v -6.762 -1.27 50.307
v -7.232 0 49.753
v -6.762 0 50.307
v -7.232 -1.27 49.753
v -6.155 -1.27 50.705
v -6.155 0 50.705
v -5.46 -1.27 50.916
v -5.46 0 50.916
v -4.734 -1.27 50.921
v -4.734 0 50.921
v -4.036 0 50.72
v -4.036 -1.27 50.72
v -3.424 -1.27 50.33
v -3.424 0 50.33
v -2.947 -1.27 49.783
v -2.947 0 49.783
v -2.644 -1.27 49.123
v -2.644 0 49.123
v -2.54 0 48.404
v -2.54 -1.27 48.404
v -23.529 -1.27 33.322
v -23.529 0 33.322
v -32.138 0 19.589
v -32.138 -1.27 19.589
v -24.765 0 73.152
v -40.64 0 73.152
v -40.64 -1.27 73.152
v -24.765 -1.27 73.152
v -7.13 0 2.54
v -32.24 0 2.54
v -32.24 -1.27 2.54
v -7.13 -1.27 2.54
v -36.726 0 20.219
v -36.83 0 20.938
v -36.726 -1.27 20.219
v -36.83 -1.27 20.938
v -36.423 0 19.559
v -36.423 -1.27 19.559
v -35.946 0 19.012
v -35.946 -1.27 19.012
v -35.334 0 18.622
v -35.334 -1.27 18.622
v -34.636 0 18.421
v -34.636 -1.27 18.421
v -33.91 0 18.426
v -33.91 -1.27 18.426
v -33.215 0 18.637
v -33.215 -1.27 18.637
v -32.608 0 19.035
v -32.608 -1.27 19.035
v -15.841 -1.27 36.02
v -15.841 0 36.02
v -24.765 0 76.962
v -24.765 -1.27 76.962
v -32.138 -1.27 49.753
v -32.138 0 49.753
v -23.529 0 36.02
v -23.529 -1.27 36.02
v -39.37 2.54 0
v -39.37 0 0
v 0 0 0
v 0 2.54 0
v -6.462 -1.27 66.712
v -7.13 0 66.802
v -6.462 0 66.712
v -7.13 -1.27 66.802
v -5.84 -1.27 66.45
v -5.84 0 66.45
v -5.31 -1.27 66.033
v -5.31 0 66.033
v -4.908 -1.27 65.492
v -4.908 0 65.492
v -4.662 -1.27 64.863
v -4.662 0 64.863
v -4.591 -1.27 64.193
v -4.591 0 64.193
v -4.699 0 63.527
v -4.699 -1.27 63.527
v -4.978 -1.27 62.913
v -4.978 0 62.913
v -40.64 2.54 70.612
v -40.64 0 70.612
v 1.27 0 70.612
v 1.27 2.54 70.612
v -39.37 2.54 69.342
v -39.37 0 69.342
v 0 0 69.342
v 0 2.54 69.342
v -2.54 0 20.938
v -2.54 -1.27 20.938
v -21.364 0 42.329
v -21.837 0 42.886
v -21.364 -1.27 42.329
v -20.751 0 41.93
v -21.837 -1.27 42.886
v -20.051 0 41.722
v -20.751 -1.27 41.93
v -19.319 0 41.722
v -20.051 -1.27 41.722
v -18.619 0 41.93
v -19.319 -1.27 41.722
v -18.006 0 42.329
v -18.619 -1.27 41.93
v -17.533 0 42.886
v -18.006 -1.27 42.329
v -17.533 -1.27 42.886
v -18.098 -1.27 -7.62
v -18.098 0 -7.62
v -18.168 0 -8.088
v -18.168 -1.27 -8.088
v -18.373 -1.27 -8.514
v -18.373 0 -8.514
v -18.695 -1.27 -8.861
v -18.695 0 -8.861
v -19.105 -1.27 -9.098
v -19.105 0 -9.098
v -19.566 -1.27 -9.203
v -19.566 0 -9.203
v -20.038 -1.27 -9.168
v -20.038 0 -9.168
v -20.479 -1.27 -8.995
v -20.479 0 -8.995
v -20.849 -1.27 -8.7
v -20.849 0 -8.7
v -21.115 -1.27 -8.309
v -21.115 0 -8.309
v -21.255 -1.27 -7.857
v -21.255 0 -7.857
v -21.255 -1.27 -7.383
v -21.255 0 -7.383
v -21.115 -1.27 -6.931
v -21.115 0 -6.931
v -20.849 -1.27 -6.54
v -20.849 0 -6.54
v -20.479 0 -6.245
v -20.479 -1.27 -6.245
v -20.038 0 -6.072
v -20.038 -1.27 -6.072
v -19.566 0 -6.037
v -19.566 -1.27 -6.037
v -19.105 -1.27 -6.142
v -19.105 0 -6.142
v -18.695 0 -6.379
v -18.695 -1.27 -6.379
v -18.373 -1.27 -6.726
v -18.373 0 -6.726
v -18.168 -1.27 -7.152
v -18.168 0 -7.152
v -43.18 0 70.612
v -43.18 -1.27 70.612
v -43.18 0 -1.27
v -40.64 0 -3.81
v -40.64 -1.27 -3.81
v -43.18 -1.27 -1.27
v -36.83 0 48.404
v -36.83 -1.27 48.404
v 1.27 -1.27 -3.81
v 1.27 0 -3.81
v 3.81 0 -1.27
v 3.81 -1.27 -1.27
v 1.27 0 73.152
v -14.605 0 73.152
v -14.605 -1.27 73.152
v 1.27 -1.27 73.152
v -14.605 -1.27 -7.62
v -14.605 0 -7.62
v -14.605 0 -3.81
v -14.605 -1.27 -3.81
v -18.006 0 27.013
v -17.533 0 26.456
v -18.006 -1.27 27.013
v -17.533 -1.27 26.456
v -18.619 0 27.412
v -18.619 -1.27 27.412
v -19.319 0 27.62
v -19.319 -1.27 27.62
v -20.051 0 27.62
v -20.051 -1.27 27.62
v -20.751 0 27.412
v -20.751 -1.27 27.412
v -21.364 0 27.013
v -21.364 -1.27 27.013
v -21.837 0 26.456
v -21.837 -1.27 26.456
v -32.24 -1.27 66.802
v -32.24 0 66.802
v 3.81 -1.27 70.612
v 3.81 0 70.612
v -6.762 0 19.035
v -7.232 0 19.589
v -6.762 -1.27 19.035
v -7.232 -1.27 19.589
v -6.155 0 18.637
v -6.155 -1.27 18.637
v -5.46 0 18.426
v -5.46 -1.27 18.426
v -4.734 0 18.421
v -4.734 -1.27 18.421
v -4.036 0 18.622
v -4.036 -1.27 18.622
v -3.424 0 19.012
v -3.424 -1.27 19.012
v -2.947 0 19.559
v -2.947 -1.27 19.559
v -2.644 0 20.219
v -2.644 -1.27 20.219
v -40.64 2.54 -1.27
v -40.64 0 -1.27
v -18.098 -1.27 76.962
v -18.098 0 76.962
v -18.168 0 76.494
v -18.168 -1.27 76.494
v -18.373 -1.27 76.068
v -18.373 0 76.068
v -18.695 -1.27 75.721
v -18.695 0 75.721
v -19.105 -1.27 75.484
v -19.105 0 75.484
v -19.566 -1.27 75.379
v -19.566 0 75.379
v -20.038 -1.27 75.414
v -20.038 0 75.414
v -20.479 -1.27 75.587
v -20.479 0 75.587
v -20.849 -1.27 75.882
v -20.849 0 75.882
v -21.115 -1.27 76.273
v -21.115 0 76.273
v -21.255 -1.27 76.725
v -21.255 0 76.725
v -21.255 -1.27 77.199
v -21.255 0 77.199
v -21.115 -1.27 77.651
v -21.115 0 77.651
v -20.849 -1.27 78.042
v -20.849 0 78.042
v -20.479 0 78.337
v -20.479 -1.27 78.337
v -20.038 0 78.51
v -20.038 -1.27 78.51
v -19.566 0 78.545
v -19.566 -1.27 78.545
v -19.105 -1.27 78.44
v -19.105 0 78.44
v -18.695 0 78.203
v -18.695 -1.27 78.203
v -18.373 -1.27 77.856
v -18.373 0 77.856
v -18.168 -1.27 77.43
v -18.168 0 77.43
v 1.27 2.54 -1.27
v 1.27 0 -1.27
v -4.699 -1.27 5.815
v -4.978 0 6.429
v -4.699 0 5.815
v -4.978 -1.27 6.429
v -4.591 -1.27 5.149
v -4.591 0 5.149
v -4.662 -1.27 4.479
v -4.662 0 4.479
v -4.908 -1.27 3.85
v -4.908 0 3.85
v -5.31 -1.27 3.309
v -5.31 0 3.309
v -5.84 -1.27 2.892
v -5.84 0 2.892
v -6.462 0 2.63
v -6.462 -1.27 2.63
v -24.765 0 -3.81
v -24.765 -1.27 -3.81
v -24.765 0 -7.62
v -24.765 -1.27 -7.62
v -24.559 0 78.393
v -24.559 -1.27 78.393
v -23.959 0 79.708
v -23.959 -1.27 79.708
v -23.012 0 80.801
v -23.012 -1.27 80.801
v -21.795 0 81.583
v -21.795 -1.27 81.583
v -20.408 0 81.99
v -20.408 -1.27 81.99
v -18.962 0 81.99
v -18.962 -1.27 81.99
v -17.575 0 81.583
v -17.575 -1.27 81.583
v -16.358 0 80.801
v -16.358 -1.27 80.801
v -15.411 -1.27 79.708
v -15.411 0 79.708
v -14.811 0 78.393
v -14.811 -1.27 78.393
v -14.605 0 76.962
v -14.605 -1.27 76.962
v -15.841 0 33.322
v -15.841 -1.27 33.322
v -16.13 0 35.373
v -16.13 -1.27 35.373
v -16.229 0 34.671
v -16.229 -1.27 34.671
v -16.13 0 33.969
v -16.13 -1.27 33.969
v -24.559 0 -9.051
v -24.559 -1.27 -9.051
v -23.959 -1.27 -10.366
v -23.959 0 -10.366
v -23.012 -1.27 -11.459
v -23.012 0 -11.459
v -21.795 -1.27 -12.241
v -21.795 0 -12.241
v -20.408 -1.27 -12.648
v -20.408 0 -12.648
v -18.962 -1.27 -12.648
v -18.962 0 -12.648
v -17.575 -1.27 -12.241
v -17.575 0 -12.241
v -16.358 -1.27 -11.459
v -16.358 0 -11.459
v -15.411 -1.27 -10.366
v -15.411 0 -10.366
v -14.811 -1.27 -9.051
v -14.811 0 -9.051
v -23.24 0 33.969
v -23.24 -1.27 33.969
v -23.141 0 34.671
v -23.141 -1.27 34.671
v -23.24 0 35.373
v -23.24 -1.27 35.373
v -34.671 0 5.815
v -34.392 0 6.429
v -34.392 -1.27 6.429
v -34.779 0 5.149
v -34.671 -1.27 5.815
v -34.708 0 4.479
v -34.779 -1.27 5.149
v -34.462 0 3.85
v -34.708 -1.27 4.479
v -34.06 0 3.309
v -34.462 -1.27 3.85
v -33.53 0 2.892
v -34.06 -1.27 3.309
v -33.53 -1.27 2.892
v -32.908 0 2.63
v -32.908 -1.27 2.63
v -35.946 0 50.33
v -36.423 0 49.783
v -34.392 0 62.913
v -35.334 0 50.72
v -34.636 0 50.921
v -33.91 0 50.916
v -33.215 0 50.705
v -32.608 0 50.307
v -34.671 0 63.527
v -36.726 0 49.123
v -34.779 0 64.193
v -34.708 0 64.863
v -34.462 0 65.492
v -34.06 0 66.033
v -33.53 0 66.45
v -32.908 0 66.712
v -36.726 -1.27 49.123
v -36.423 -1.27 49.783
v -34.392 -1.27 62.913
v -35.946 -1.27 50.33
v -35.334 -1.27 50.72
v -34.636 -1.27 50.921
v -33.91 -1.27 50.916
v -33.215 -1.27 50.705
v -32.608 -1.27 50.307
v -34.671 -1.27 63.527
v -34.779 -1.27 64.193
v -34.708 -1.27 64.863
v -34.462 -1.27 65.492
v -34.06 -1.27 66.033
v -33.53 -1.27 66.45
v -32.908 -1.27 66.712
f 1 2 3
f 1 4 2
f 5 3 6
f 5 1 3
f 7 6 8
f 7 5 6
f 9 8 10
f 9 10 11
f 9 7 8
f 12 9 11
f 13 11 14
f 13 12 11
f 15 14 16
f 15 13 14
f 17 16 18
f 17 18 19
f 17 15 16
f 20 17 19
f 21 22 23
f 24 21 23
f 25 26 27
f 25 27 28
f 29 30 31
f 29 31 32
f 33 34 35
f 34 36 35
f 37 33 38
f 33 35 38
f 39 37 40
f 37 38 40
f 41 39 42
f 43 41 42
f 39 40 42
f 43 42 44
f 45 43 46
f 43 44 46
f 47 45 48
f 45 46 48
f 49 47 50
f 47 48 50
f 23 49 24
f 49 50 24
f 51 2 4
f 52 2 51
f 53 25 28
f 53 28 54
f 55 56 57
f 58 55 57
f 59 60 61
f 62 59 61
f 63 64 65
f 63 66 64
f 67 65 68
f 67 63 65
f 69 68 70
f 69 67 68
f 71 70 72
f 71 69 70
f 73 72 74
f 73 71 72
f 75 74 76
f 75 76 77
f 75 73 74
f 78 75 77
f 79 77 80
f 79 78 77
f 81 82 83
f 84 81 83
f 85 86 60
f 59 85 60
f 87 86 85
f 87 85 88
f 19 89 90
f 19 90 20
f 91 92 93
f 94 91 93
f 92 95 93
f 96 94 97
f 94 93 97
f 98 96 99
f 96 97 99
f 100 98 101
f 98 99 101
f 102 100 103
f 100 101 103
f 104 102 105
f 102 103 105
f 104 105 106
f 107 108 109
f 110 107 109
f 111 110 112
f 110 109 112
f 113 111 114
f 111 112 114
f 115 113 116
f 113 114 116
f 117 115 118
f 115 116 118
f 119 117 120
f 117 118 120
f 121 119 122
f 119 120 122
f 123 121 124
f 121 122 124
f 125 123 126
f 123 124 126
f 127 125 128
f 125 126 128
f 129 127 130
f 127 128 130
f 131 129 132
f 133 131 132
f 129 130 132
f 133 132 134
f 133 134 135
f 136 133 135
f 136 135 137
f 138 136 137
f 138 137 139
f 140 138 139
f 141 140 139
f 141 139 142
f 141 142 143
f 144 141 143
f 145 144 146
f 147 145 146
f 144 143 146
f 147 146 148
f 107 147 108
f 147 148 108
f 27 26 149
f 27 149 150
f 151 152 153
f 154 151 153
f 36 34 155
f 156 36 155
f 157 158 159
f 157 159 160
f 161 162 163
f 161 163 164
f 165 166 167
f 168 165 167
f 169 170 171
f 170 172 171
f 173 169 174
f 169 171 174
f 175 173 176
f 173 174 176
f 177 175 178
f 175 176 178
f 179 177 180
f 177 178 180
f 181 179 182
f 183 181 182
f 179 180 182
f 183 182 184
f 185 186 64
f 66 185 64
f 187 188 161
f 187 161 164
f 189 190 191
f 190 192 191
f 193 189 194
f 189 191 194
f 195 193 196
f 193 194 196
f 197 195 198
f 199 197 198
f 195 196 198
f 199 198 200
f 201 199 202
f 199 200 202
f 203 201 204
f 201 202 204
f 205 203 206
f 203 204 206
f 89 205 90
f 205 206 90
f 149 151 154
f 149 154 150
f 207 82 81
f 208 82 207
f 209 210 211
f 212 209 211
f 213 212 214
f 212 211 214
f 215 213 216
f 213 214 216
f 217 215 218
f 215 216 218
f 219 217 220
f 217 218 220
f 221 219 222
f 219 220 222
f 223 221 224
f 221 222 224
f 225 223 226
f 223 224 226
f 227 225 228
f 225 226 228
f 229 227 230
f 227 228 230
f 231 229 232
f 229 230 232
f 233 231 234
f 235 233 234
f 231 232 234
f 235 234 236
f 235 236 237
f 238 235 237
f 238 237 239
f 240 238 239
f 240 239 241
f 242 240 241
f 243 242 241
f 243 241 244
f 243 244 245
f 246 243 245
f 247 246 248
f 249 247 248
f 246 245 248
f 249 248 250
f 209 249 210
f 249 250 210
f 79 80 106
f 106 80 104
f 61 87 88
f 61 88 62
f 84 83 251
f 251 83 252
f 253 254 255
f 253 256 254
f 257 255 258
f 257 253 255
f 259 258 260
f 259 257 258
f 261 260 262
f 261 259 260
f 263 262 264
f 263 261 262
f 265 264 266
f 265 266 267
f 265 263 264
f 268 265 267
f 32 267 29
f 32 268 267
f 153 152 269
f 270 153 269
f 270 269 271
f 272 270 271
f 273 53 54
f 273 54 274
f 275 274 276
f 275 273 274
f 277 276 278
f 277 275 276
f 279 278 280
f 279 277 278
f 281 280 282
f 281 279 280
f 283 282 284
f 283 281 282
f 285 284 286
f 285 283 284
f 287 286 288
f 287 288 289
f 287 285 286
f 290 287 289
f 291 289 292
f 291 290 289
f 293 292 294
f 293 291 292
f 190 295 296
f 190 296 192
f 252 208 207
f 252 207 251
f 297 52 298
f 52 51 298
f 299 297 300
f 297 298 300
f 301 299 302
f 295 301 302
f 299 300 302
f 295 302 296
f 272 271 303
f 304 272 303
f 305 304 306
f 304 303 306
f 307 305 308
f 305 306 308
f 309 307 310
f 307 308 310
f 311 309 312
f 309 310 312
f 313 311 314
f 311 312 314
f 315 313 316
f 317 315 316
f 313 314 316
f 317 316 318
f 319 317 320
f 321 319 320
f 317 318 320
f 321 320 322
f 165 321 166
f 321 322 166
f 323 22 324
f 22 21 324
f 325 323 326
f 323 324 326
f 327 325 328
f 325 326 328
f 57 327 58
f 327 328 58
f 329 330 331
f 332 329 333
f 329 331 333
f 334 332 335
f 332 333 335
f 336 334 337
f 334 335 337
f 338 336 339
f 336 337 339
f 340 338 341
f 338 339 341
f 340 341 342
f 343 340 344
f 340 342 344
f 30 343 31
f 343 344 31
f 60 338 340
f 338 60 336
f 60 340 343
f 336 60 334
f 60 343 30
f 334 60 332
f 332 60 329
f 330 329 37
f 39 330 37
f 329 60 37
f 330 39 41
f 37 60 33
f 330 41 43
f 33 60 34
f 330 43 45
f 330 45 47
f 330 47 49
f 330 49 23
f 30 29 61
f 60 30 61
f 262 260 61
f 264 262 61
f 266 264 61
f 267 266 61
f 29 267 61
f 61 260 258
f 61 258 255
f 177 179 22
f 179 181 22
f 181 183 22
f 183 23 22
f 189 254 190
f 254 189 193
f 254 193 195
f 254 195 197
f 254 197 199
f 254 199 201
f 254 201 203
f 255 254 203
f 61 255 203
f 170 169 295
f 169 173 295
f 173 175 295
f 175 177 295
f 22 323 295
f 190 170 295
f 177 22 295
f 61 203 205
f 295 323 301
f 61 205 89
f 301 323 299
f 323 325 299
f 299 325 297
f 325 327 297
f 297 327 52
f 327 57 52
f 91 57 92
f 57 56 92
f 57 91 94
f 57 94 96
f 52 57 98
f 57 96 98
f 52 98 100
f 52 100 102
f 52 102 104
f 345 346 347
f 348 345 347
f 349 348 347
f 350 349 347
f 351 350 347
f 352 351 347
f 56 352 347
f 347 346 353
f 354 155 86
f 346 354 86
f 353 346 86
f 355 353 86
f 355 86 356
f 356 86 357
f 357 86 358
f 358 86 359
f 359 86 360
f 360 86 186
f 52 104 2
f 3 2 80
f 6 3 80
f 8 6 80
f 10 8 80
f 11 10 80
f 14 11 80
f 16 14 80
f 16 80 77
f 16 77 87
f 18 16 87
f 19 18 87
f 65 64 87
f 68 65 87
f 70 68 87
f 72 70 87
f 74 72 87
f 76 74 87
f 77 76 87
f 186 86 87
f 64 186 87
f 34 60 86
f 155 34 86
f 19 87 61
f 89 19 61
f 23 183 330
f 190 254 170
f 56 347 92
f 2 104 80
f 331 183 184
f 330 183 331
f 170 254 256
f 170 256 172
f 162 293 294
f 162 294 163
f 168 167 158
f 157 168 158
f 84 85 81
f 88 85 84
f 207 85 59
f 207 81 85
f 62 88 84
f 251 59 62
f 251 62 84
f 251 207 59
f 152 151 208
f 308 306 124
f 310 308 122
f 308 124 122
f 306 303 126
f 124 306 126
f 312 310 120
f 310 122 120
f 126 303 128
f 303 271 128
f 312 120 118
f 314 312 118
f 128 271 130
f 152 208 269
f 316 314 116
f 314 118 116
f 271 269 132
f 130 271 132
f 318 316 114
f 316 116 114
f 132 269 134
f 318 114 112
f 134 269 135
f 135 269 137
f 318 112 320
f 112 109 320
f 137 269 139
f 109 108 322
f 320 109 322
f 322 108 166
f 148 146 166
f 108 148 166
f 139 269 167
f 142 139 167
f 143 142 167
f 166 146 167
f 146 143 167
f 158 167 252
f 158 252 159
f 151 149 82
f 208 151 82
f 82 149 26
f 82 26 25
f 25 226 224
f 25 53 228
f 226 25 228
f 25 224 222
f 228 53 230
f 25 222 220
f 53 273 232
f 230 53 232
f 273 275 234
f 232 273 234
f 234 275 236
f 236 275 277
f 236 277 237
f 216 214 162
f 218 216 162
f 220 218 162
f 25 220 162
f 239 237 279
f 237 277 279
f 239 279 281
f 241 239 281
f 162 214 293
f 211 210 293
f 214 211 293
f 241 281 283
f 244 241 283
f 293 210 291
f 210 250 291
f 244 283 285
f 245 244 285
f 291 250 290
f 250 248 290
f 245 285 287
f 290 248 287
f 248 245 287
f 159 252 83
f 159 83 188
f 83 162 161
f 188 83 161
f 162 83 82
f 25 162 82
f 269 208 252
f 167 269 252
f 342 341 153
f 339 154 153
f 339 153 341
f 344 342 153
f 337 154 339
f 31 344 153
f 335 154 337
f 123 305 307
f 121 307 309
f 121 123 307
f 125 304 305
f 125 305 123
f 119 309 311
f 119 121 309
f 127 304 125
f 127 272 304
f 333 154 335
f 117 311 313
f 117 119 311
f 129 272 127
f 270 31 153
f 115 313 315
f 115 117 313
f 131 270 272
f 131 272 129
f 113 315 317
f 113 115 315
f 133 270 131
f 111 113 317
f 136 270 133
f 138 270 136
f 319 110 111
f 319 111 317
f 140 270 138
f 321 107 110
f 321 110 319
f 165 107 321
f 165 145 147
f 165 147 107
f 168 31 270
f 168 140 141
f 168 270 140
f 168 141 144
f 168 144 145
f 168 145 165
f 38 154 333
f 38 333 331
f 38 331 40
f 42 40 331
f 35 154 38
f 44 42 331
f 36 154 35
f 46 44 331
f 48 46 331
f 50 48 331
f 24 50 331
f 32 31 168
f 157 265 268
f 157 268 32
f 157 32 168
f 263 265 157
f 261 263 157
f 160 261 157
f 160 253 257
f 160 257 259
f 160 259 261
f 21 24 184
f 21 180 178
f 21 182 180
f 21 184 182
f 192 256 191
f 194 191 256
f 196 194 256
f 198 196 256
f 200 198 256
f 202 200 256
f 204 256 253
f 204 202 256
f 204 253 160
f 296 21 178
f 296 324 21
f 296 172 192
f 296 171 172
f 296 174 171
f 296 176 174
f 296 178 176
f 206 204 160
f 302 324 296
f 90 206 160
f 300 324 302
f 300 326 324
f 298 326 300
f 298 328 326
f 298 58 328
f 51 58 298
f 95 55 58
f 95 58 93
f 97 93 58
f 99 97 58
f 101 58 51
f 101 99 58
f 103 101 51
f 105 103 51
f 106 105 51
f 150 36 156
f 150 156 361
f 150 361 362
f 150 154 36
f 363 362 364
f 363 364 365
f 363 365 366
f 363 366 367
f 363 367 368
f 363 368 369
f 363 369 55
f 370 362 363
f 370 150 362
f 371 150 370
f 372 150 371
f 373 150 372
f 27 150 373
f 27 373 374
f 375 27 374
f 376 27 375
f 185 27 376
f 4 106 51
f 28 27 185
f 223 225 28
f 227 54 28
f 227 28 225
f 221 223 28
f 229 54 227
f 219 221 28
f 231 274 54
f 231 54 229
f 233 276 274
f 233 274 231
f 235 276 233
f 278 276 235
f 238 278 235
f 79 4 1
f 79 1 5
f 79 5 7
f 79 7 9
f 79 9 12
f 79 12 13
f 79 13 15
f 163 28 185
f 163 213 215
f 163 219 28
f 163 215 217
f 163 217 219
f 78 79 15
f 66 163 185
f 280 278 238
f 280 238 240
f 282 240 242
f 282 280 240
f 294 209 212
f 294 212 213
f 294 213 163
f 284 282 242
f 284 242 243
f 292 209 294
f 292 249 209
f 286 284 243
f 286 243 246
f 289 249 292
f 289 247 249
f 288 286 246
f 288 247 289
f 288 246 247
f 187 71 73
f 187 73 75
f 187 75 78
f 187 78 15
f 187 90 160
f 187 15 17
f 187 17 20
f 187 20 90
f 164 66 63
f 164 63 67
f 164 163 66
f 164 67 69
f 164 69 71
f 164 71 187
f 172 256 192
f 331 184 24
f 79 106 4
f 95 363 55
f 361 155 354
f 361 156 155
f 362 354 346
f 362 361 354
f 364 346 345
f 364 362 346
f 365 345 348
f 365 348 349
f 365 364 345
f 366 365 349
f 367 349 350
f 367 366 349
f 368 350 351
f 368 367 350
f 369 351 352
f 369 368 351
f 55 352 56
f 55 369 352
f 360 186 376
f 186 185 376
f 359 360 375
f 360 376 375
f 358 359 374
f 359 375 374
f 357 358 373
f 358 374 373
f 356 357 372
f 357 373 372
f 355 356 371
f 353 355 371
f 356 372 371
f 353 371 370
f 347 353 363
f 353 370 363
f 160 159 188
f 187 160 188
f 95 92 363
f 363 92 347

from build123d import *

# Parameters (mm, degrees)
SKETCH1_W           = 41.91
SKETCH1_H           = 71.882
SKETCH1_W_2         = 39.37
SKETCH1_H_2         = 69.342
BOSS_EXTRUDE4_DEPTH = 2.54
SKETCH5_W           = 46.99
SKETCH5_H           = 76.962
BOSS_EXTRUDE5_DEPTH = 1.27
CHAMFER4_SIZE       = 2.54
CUT_EXTRUDE1_DEPTH  = 2.54
FILLET1_R           = 2.54
SKETCH7_R           = 1.5875
BOSS_EXTRUDE6_DEPTH = 1.27


with BuildPart() as part:
    # Sketch1 → Boss-Extrude4 (new body)
    with BuildSketch(Plane(origin=(0, 0, 0), x_dir=(1, 0, 0), z_dir=(0, 1, 0))):
        with Locations((-19.685, -34.671)):
            Rectangle(SKETCH1_W, SKETCH1_H)
        with Locations((-19.685, -34.671)):
            Rectangle(SKETCH1_W_2, SKETCH1_H_2, mode=Mode.SUBTRACT)
    extrude(amount=BOSS_EXTRUDE4_DEPTH)

    # Sketch5 → Boss-Extrude5 (add)
    with BuildSketch(Plane.XZ):
        with Locations((-19.685, 34.671)):
            Rectangle(SKETCH5_W, SKETCH5_H)
    extrude(amount=BOSS_EXTRUDE5_DEPTH)

    # Chamfer4
    chamfer4_edges = [part.edges().sort_by_distance(p)[0] for p in [
        (-43.18, -0.635, 73.152),
        (-43.18, -0.635, -3.81),
        (3.81, -0.635, -3.81),
        (3.81, -0.635, 73.152),
    ]]
    chamfer(chamfer4_edges, length=CHAMFER4_SIZE)

    # Sketch6 → Cut-Extrude1 (cut)
    with BuildSketch(Plane(origin=(0, 0, 0), x_dir=(1, 0, 0), z_dir=(0, 1, 0))):
        Polygon((-36.83, -2.54), (-2.54, -2.54), (-19.685, -29.888964801), align=None)
        Polygon((-36.83, -12.104070398), (-36.83, -57.237929602), (-22.68284632, -34.671), align=None)
        Polygon((-36.83, -66.802), (-2.54, -66.802), (-19.685, -39.453035199), align=None)
        Polygon((-2.54, -12.104070398), (-2.54, -57.237929602), (-16.68715368, -34.671), align=None)
    extrude(amount=-CUT_EXTRUDE1_DEPTH, mode=Mode.SUBTRACT)

    # Fillet1
    fillet1_edges = [part.edges().sort_by_distance(p)[0] for p in [
        (-2.54, -0.635, 2.54),
        (-19.685, -0.635, 29.888964801),
        (-36.83, -0.635, 2.54),
        (-36.83, -0.635, 66.802),
        (-19.685, -0.635, 39.453035199),
        (-2.54, -0.635, 66.802),
        (-22.68284632, -0.635, 34.671),
        (-36.83, -0.635, 57.237929602),
        (-36.83, -0.635, 12.104070398),
        (-16.68715368, -0.635, 34.671),
        (-2.54, -0.635, 12.104070398),
        (-2.54, -0.635, 57.237929602),
    ]]
    fillet(fillet1_edges, radius=FILLET1_R)

    # Sketch7 → Boss-Extrude6 (add)
    with BuildSketch(Plane(origin=(0, 0, 0), x_dir=(1, 0, 0), z_dir=(0, 1, 0))):
        with BuildLine():
            Line((-14.605, 7.62), (-14.605, 3.81))
            Line((-14.605, 3.81), (-24.765, 3.81))
            Line((-24.765, 3.81), (-24.765, 7.62))
            ThreePointArc((-24.765, 7.62), (-19.685, 12.7), (-14.605, 7.62))
        make_face()
        with Locations((-19.685, 7.62)):
            Circle(SKETCH7_R, mode=Mode.SUBTRACT)
        with BuildLine():
            Line((-24.765, -73.152), (-24.765, -76.962))
            ThreePointArc((-24.765, -76.962), (-19.685, -82.042), (-14.605, -76.962))
            Line((-14.605, -76.962), (-14.605, -73.152))
            Line((-14.605, -73.152), (-24.765, -73.152))
        make_face()
        with Locations((-19.685, -76.962)):
            Circle(SKETCH7_R, mode=Mode.SUBTRACT)
    extrude(amount=-BOSS_EXTRUDE6_DEPTH)


solid = part.part
